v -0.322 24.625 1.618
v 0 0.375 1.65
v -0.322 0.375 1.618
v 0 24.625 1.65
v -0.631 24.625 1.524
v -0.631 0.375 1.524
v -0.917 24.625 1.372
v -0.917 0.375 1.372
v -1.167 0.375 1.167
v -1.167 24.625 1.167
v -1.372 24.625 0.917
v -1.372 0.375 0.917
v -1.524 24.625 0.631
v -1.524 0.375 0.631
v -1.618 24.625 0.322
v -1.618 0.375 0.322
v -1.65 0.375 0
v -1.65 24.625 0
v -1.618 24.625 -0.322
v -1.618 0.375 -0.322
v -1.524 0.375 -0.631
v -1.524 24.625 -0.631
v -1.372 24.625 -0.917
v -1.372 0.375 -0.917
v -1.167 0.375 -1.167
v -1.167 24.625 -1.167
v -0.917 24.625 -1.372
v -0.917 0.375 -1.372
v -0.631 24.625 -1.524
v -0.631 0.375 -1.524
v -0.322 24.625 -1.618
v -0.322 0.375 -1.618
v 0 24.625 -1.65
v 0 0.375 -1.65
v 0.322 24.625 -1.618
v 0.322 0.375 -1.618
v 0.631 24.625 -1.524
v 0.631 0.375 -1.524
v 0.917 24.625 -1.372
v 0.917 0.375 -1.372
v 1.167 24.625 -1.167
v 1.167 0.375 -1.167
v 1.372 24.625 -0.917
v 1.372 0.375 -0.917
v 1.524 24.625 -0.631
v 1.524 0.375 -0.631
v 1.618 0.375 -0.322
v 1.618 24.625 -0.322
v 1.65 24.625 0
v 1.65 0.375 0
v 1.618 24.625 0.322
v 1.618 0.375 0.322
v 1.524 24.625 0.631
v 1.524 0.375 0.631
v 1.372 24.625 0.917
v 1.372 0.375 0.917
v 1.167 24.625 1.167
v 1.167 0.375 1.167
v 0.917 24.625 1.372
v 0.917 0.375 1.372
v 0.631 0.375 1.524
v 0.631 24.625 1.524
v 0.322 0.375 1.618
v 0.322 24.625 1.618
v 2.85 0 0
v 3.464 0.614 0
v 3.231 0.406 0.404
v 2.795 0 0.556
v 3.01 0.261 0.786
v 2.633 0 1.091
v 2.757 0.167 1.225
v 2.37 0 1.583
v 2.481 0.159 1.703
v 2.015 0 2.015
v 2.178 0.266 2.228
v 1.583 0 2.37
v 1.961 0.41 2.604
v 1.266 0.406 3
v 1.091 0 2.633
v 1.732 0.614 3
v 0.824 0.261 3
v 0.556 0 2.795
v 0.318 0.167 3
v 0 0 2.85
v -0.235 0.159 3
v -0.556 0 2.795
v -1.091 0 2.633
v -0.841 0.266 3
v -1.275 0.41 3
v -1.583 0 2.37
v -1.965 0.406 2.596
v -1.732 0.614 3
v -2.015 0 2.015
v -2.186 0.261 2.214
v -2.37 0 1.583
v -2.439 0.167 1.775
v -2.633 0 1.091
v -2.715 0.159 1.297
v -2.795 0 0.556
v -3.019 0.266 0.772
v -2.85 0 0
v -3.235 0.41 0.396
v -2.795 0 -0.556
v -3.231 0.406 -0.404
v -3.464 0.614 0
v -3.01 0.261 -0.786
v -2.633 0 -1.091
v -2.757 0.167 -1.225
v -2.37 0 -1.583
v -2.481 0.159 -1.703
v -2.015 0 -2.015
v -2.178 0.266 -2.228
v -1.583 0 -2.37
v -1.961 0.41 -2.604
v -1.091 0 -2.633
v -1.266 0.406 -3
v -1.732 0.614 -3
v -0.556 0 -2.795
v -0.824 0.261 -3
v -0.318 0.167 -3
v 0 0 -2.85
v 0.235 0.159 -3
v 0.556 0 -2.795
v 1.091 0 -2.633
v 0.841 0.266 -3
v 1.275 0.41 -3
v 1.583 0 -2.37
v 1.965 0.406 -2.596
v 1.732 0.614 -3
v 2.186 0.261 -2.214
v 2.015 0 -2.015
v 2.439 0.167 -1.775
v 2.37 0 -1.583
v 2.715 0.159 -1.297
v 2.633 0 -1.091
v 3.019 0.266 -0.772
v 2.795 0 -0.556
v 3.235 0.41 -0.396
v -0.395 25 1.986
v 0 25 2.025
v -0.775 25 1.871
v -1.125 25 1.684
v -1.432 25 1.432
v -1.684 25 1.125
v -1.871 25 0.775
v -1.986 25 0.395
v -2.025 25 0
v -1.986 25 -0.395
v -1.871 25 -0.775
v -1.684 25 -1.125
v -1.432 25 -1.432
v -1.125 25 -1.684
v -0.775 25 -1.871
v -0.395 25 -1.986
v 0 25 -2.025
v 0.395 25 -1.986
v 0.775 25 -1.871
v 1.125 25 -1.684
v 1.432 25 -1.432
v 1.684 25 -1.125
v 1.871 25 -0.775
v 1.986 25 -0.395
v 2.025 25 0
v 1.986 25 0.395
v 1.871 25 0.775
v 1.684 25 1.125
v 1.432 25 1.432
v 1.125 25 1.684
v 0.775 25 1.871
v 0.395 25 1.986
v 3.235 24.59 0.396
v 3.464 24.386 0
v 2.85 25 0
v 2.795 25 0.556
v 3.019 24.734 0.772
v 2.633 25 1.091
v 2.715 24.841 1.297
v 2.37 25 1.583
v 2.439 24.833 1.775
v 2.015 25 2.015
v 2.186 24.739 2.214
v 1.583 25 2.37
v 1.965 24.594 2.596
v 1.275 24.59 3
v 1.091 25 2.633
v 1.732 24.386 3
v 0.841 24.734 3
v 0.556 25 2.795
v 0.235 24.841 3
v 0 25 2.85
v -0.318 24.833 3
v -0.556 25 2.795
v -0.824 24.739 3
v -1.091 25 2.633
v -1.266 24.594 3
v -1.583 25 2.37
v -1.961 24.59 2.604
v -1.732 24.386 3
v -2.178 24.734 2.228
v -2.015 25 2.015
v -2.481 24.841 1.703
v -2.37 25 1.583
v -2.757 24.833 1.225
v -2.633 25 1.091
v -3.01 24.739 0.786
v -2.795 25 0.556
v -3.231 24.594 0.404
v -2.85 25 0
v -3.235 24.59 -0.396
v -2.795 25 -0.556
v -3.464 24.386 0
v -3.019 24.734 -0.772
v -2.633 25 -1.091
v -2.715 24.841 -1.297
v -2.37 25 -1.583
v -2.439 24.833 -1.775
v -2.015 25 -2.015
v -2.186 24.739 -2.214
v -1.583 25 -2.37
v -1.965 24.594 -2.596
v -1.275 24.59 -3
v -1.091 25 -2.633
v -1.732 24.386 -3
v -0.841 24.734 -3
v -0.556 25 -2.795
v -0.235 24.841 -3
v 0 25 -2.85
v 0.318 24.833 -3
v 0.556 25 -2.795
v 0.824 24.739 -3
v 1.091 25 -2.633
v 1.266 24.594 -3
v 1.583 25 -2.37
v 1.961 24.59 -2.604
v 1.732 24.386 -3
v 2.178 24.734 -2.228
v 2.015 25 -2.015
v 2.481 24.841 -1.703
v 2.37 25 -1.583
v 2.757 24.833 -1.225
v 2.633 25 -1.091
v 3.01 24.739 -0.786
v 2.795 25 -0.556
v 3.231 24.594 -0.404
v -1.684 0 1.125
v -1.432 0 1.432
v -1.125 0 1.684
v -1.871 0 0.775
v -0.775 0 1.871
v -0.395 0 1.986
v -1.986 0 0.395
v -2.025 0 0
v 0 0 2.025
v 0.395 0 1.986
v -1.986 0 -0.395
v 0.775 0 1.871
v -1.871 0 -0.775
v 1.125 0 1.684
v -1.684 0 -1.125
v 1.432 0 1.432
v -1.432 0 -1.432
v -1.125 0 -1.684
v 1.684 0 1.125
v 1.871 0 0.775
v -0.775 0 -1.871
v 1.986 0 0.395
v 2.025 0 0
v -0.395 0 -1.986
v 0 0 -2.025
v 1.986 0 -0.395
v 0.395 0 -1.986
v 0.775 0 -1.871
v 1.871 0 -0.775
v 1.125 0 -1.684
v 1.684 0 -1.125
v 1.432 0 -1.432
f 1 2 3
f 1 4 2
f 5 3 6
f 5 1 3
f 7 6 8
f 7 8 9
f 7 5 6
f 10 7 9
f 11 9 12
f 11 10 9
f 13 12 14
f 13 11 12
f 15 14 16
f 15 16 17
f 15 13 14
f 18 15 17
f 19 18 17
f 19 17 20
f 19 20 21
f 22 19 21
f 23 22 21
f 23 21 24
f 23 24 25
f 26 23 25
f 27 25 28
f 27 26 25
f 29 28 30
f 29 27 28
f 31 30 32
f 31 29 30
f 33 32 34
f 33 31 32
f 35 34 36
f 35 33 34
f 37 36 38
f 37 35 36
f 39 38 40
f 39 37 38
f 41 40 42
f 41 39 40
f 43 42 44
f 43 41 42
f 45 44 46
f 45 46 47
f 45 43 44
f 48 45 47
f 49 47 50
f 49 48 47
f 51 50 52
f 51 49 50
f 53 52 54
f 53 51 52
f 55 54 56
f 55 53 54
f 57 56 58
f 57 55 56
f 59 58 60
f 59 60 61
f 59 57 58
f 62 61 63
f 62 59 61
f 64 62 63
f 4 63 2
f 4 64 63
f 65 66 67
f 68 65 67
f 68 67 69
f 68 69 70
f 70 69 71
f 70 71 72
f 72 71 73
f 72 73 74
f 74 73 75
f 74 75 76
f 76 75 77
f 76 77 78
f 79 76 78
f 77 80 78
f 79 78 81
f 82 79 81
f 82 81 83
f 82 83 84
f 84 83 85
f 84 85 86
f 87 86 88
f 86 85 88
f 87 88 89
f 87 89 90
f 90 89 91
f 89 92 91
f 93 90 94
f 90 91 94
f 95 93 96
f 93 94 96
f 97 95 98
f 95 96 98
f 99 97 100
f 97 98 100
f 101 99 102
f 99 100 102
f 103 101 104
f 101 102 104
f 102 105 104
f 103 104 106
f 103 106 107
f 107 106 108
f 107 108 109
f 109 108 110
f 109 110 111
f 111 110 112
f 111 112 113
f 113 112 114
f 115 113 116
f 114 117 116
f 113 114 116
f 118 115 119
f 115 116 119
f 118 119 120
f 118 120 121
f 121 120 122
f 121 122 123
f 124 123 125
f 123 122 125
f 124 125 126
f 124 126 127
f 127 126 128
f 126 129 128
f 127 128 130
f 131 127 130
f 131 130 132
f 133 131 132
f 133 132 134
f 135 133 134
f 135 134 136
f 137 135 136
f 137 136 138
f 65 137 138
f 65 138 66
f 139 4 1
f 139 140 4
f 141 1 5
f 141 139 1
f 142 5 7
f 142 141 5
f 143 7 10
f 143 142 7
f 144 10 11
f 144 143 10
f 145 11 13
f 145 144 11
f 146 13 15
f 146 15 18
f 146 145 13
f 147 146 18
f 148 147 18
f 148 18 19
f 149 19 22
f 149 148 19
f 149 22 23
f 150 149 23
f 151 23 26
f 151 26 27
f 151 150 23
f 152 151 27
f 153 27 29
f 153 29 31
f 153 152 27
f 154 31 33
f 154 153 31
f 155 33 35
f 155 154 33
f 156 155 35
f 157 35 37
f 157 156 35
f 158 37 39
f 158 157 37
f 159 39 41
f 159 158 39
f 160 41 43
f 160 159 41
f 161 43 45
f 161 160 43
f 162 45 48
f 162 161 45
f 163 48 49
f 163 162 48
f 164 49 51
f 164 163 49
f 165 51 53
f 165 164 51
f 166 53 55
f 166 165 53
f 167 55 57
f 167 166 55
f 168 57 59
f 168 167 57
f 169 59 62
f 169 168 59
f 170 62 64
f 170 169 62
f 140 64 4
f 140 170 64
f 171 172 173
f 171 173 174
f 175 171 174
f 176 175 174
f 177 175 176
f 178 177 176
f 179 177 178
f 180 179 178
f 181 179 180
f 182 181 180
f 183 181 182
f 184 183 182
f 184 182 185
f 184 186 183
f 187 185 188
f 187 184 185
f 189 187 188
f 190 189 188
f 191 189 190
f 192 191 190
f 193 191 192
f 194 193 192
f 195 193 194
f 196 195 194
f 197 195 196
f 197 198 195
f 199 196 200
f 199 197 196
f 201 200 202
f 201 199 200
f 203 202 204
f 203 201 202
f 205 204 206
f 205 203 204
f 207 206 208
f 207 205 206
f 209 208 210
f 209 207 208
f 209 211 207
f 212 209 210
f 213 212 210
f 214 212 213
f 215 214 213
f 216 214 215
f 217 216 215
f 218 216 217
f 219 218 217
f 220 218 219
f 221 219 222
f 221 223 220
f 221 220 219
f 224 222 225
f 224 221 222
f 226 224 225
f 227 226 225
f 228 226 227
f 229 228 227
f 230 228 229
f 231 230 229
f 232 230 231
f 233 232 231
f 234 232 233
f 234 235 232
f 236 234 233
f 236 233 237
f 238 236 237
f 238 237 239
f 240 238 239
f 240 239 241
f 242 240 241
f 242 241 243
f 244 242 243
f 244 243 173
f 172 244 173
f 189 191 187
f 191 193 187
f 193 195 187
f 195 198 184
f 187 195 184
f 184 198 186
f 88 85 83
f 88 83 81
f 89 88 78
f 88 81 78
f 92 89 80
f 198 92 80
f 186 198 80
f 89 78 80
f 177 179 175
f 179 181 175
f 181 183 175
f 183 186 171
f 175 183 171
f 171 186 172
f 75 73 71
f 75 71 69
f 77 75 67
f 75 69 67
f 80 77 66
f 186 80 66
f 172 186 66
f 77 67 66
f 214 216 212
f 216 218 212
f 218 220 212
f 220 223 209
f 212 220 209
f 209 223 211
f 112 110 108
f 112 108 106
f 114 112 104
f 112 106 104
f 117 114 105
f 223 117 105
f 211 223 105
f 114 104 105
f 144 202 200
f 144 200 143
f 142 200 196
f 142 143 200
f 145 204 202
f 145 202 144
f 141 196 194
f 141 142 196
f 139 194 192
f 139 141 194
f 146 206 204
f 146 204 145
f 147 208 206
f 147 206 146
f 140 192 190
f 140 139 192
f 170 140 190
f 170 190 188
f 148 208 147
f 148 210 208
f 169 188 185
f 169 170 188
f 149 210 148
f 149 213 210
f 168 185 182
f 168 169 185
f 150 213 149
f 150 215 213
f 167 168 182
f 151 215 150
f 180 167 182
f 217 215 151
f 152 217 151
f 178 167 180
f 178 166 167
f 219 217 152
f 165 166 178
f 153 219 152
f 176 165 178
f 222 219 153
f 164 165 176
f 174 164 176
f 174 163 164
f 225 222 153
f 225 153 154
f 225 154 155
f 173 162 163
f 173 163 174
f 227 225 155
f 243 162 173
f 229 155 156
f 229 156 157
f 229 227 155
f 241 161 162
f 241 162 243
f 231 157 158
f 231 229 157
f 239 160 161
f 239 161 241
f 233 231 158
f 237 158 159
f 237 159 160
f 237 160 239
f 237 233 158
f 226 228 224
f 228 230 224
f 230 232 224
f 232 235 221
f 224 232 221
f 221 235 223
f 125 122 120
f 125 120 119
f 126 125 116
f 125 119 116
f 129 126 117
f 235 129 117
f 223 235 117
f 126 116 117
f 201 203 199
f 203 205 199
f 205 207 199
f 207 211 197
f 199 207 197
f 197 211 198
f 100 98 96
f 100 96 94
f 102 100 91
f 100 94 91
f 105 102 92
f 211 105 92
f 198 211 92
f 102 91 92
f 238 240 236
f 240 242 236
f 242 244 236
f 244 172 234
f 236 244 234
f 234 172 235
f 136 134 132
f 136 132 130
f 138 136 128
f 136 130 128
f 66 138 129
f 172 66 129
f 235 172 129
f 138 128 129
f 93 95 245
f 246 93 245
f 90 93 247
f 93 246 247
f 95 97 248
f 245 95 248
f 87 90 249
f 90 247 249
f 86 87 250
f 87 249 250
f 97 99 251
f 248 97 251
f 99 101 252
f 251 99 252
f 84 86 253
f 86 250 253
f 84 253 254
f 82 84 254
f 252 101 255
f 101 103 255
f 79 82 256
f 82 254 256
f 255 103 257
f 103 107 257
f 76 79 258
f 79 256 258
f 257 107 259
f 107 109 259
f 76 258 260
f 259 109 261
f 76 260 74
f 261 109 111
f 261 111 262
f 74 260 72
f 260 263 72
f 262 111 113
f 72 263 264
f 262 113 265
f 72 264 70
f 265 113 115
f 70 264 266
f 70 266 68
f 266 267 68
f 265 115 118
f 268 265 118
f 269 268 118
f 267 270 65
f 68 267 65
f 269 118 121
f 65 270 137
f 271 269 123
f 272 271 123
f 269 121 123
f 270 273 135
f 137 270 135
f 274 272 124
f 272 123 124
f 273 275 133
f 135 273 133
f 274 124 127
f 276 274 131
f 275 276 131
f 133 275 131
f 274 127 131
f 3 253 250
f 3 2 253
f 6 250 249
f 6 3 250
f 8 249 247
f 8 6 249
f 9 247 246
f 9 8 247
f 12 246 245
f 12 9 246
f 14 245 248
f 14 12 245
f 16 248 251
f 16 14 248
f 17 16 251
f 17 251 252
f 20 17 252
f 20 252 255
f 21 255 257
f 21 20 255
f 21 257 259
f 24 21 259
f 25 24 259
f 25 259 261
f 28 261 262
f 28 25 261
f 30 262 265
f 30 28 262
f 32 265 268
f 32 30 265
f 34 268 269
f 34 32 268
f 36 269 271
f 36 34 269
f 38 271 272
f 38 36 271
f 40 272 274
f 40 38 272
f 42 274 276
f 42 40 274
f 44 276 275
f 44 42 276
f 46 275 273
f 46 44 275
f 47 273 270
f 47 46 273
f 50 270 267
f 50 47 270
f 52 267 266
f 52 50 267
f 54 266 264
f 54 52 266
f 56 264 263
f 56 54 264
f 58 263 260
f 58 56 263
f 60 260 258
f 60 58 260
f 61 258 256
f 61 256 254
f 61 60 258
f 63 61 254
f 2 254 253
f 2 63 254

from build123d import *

# Parameters (mm, degrees)
BOSS_EXTRUDE1_DEPTH = 25


with BuildPart() as part:
    # Sketch1 → Boss-Extrude1 (new body)
    with BuildSketch(Plane(origin=(0, 0, 0), x_dir=(1, 0, 0), z_dir=(0, 1, 0))):
        Polygon((1.732050808, 3), (-1.732050808, 3), (-3.464101615, 0), (-1.732050808, -3), (1.732050808, -3), (3.464101615, 0), align=None)
    extrude(amount=BOSS_EXTRUDE1_DEPTH)

    # Sketch2 → M4 Tapped Hole1 (revolve, cut)
    with BuildSketch(Plane(origin=(0, 25, 0), x_dir=(0, 0, 1), z_dir=(1, 0, 0))):
        Polygon((0, 0), (0, 25), (2.025, 25), (1.65, 24.625), (1.65, 0.375), (2.025, 0), align=None)
    revolve(axis=Axis((0, 31.35, 0), (0, -1, 0)), mode=Mode.SUBTRACT)

    # Sketch4 → Cut-Revolve1 (revolve, cut)
    with BuildSketch(Plane.XY):
        Polygon((2.85, 0), (3.464101615, 0.614101615), (3.464101615, 0), align=None)
        Polygon((3.464101615, 25), (2.85, 25), (3.464101615, 24.385898385), align=None)
    revolve(axis=Axis((0, 25, 0), (0, -1, 0)), mode=Mode.SUBTRACT)


solid = part.part
